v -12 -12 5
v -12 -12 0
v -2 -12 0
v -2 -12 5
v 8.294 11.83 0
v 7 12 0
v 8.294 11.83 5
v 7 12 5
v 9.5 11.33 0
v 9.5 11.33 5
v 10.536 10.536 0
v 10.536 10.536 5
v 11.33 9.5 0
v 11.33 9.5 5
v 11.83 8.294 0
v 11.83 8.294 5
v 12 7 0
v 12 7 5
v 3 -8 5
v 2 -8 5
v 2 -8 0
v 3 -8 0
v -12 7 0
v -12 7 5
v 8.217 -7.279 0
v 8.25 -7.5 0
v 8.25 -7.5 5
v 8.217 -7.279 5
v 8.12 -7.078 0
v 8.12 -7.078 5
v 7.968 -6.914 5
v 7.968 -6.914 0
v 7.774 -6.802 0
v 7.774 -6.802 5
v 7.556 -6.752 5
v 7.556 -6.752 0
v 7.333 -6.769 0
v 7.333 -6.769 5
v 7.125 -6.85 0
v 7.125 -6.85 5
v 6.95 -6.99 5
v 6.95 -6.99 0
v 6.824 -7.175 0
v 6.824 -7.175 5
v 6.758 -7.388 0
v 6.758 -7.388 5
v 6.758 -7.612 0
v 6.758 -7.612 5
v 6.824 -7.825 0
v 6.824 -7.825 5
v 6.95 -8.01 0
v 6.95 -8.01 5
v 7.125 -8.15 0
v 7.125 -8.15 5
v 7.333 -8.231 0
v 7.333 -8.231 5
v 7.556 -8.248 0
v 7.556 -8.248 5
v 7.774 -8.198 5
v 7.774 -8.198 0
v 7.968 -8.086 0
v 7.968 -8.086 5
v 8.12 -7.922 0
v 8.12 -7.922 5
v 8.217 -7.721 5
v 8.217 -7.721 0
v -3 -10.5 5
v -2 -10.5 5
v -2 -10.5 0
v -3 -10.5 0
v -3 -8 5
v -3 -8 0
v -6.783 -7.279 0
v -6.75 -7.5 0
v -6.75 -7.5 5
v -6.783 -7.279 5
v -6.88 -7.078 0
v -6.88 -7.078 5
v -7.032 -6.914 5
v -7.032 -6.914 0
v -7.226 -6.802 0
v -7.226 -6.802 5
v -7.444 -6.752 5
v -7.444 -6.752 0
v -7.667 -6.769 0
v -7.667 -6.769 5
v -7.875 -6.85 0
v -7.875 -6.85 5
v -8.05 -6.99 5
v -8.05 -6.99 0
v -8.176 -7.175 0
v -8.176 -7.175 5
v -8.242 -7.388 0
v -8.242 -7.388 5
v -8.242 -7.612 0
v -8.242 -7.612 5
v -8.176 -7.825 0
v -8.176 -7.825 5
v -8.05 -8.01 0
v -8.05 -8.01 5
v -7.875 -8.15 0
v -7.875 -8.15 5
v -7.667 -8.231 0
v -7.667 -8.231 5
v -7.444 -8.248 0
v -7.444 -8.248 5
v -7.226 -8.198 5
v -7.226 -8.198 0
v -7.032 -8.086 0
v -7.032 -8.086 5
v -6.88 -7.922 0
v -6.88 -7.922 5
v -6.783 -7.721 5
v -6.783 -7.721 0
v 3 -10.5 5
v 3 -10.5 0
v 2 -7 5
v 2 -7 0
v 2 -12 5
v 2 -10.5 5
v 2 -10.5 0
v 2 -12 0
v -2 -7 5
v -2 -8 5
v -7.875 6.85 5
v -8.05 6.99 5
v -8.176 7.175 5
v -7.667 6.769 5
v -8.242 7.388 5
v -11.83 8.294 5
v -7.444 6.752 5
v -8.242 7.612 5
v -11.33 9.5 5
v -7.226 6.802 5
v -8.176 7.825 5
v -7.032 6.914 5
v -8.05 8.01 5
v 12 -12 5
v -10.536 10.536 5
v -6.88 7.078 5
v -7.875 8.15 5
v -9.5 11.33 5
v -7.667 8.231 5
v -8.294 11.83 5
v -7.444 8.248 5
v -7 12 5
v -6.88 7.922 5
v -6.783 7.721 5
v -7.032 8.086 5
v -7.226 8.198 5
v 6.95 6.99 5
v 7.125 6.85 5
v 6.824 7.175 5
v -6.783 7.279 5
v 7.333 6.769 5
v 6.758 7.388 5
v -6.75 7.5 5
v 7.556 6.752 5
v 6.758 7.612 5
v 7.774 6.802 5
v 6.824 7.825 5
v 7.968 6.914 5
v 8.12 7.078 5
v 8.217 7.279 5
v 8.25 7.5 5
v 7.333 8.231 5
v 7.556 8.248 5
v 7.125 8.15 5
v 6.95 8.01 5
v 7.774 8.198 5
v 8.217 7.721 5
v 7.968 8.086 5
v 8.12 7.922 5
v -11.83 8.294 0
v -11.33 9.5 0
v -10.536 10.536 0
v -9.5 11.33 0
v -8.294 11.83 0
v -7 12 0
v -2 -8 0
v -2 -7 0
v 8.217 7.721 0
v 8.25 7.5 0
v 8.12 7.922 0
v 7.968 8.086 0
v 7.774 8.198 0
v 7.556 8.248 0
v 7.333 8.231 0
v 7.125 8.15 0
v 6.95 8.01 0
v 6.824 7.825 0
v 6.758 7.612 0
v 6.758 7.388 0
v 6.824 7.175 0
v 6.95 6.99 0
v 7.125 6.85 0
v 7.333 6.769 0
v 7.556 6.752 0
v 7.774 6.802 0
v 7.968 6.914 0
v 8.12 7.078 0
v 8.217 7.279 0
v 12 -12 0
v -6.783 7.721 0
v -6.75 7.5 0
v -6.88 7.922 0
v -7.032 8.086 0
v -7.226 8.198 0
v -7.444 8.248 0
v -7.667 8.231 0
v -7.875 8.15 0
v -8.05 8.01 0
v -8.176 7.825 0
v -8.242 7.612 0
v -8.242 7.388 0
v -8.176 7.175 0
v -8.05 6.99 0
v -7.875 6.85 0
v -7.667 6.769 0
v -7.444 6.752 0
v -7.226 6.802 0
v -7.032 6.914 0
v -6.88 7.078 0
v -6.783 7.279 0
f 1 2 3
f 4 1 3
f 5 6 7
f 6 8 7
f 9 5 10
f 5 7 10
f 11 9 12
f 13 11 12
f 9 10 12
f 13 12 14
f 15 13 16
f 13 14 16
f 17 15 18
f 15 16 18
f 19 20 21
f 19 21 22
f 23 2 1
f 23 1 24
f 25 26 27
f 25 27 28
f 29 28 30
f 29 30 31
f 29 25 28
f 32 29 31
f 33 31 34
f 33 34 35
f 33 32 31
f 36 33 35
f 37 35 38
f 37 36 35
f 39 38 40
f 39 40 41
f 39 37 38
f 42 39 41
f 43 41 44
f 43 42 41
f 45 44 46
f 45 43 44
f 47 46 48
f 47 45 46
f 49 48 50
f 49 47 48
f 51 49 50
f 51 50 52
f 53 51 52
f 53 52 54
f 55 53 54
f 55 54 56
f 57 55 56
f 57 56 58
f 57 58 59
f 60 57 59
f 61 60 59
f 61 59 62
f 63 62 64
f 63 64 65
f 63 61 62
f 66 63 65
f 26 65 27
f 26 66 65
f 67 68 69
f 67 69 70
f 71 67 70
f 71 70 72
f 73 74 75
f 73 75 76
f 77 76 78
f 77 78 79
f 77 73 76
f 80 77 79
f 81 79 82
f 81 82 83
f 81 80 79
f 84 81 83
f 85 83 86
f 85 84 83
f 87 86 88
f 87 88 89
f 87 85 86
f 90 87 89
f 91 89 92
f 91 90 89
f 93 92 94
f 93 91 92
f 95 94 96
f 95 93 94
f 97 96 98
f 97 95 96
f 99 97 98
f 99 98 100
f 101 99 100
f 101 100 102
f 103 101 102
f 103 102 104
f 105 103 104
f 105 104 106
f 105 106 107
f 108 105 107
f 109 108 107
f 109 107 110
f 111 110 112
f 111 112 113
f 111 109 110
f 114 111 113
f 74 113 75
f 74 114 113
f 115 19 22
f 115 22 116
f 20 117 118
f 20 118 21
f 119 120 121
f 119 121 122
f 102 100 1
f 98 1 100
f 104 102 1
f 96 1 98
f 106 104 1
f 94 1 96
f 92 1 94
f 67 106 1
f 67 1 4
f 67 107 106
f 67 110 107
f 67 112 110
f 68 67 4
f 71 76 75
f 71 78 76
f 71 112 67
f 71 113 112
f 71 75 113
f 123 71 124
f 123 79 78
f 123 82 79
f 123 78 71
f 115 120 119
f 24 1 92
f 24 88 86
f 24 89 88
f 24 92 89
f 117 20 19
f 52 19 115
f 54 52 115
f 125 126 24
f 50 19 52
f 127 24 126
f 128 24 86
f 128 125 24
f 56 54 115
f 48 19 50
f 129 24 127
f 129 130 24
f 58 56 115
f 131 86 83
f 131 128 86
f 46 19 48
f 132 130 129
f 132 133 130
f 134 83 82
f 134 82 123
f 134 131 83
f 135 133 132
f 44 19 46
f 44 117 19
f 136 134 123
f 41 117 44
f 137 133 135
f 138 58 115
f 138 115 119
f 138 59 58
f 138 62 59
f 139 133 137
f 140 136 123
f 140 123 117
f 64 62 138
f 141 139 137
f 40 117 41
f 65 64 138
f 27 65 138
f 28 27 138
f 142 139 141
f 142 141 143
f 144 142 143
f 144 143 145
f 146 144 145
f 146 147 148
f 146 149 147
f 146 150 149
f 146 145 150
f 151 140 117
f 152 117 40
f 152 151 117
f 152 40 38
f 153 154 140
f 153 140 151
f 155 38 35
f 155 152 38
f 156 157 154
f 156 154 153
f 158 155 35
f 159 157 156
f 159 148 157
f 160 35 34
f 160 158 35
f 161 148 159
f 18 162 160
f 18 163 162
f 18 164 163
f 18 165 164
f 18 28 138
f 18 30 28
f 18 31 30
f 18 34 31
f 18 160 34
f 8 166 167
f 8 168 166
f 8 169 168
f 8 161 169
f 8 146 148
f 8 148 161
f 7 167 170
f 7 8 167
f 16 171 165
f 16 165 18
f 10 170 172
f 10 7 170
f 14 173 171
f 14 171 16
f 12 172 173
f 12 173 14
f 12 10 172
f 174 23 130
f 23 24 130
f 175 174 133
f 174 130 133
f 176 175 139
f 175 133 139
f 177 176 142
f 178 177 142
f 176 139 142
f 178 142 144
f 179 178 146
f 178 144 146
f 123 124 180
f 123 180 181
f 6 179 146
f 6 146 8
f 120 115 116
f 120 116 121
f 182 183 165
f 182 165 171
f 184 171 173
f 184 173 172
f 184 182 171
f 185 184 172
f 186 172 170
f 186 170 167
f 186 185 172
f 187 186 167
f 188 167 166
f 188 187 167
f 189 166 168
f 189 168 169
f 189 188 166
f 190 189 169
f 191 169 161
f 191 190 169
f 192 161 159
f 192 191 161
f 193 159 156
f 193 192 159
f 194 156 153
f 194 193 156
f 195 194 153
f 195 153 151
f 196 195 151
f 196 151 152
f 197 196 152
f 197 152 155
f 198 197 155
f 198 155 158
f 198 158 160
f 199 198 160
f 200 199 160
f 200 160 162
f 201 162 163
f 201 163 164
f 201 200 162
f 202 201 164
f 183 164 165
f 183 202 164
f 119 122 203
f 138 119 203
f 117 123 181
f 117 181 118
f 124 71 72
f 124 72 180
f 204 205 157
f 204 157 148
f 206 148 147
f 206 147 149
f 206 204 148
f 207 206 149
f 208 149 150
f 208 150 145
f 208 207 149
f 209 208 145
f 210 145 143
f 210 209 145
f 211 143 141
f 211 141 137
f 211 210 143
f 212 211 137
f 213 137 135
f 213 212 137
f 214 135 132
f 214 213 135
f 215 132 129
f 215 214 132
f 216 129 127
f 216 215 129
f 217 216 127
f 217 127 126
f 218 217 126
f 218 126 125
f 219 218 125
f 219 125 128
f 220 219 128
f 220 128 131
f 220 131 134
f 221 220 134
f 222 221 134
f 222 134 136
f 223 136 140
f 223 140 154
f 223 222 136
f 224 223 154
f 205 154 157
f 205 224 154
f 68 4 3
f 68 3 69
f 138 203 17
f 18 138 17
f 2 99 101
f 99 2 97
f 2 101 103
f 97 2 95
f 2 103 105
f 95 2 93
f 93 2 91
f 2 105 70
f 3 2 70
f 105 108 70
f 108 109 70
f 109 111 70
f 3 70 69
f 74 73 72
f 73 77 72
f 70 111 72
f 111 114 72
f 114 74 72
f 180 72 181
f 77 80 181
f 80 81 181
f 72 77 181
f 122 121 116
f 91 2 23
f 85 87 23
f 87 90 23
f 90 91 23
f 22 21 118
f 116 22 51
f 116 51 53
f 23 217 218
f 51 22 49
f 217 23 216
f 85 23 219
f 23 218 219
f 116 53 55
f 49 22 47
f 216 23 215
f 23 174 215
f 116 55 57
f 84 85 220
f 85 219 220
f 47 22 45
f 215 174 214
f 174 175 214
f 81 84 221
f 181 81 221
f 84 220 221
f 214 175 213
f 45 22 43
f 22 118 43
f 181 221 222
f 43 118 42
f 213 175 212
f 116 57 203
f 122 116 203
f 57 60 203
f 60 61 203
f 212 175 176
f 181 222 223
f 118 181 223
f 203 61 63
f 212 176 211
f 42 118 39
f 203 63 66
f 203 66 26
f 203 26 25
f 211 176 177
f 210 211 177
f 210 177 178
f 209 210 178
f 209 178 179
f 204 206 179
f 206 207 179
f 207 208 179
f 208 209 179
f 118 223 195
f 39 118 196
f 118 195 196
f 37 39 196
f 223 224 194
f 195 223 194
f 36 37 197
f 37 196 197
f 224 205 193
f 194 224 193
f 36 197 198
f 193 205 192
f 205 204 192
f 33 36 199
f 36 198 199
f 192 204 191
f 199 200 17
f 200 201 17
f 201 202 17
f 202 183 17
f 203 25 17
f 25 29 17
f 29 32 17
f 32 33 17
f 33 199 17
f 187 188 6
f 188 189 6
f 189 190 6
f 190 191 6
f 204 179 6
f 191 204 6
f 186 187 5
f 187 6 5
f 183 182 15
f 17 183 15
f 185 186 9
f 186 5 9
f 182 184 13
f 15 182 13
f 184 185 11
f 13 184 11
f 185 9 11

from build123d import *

# Parameters (mm, degrees)
SKETCH1_W           = 24
SKETCH1_H           = 24
SKETCH1_R           = 0.75
BOSS_EXTRUDE1_DEPTH = 5
FILLET1_R           = 5
CUT_EXTRUDE1_DEPTH  = 10


with BuildPart() as part:
    # Sketch1 → Boss-Extrude1 (new body)
    with BuildSketch(Plane.XY):
        Rectangle(SKETCH1_W, SKETCH1_H)
        with Locations((-7.5, 7.5)):
            Circle(SKETCH1_R, mode=Mode.SUBTRACT)
        with Locations((7.5, 7.5)):
            Circle(SKETCH1_R, mode=Mode.SUBTRACT)
        with Locations((7.5, -7.5)):
            Circle(SKETCH1_R, mode=Mode.SUBTRACT)
        with Locations((-7.5, -7.5)):
            Circle(SKETCH1_R, mode=Mode.SUBTRACT)
    extrude(amount=BOSS_EXTRUDE1_DEPTH)

    # Fillet1
    fillet1_edges = [part.edges().sort_by_distance(p)[0] for p in [
        (-12, 12, 2.5),
        (12, 12, 2.5),
    ]]
    fillet(fillet1_edges, radius=FILLET1_R)

    # Sketch2 → Cut-Extrude1 (cut)
    with BuildSketch(Plane.XY.offset(5)):
        Polygon((-2, -12), (-2, -10.5), (-3, -10.5), (-3, -8), (-2, -8), (-2, -7), (2, -7), (2, -8), (3, -8), (3, -10.5), (2, -10.5), (2, -12), align=None)
    extrude(amount=-CUT_EXTRUDE1_DEPTH, mode=Mode.SUBTRACT)


solid = part.part
